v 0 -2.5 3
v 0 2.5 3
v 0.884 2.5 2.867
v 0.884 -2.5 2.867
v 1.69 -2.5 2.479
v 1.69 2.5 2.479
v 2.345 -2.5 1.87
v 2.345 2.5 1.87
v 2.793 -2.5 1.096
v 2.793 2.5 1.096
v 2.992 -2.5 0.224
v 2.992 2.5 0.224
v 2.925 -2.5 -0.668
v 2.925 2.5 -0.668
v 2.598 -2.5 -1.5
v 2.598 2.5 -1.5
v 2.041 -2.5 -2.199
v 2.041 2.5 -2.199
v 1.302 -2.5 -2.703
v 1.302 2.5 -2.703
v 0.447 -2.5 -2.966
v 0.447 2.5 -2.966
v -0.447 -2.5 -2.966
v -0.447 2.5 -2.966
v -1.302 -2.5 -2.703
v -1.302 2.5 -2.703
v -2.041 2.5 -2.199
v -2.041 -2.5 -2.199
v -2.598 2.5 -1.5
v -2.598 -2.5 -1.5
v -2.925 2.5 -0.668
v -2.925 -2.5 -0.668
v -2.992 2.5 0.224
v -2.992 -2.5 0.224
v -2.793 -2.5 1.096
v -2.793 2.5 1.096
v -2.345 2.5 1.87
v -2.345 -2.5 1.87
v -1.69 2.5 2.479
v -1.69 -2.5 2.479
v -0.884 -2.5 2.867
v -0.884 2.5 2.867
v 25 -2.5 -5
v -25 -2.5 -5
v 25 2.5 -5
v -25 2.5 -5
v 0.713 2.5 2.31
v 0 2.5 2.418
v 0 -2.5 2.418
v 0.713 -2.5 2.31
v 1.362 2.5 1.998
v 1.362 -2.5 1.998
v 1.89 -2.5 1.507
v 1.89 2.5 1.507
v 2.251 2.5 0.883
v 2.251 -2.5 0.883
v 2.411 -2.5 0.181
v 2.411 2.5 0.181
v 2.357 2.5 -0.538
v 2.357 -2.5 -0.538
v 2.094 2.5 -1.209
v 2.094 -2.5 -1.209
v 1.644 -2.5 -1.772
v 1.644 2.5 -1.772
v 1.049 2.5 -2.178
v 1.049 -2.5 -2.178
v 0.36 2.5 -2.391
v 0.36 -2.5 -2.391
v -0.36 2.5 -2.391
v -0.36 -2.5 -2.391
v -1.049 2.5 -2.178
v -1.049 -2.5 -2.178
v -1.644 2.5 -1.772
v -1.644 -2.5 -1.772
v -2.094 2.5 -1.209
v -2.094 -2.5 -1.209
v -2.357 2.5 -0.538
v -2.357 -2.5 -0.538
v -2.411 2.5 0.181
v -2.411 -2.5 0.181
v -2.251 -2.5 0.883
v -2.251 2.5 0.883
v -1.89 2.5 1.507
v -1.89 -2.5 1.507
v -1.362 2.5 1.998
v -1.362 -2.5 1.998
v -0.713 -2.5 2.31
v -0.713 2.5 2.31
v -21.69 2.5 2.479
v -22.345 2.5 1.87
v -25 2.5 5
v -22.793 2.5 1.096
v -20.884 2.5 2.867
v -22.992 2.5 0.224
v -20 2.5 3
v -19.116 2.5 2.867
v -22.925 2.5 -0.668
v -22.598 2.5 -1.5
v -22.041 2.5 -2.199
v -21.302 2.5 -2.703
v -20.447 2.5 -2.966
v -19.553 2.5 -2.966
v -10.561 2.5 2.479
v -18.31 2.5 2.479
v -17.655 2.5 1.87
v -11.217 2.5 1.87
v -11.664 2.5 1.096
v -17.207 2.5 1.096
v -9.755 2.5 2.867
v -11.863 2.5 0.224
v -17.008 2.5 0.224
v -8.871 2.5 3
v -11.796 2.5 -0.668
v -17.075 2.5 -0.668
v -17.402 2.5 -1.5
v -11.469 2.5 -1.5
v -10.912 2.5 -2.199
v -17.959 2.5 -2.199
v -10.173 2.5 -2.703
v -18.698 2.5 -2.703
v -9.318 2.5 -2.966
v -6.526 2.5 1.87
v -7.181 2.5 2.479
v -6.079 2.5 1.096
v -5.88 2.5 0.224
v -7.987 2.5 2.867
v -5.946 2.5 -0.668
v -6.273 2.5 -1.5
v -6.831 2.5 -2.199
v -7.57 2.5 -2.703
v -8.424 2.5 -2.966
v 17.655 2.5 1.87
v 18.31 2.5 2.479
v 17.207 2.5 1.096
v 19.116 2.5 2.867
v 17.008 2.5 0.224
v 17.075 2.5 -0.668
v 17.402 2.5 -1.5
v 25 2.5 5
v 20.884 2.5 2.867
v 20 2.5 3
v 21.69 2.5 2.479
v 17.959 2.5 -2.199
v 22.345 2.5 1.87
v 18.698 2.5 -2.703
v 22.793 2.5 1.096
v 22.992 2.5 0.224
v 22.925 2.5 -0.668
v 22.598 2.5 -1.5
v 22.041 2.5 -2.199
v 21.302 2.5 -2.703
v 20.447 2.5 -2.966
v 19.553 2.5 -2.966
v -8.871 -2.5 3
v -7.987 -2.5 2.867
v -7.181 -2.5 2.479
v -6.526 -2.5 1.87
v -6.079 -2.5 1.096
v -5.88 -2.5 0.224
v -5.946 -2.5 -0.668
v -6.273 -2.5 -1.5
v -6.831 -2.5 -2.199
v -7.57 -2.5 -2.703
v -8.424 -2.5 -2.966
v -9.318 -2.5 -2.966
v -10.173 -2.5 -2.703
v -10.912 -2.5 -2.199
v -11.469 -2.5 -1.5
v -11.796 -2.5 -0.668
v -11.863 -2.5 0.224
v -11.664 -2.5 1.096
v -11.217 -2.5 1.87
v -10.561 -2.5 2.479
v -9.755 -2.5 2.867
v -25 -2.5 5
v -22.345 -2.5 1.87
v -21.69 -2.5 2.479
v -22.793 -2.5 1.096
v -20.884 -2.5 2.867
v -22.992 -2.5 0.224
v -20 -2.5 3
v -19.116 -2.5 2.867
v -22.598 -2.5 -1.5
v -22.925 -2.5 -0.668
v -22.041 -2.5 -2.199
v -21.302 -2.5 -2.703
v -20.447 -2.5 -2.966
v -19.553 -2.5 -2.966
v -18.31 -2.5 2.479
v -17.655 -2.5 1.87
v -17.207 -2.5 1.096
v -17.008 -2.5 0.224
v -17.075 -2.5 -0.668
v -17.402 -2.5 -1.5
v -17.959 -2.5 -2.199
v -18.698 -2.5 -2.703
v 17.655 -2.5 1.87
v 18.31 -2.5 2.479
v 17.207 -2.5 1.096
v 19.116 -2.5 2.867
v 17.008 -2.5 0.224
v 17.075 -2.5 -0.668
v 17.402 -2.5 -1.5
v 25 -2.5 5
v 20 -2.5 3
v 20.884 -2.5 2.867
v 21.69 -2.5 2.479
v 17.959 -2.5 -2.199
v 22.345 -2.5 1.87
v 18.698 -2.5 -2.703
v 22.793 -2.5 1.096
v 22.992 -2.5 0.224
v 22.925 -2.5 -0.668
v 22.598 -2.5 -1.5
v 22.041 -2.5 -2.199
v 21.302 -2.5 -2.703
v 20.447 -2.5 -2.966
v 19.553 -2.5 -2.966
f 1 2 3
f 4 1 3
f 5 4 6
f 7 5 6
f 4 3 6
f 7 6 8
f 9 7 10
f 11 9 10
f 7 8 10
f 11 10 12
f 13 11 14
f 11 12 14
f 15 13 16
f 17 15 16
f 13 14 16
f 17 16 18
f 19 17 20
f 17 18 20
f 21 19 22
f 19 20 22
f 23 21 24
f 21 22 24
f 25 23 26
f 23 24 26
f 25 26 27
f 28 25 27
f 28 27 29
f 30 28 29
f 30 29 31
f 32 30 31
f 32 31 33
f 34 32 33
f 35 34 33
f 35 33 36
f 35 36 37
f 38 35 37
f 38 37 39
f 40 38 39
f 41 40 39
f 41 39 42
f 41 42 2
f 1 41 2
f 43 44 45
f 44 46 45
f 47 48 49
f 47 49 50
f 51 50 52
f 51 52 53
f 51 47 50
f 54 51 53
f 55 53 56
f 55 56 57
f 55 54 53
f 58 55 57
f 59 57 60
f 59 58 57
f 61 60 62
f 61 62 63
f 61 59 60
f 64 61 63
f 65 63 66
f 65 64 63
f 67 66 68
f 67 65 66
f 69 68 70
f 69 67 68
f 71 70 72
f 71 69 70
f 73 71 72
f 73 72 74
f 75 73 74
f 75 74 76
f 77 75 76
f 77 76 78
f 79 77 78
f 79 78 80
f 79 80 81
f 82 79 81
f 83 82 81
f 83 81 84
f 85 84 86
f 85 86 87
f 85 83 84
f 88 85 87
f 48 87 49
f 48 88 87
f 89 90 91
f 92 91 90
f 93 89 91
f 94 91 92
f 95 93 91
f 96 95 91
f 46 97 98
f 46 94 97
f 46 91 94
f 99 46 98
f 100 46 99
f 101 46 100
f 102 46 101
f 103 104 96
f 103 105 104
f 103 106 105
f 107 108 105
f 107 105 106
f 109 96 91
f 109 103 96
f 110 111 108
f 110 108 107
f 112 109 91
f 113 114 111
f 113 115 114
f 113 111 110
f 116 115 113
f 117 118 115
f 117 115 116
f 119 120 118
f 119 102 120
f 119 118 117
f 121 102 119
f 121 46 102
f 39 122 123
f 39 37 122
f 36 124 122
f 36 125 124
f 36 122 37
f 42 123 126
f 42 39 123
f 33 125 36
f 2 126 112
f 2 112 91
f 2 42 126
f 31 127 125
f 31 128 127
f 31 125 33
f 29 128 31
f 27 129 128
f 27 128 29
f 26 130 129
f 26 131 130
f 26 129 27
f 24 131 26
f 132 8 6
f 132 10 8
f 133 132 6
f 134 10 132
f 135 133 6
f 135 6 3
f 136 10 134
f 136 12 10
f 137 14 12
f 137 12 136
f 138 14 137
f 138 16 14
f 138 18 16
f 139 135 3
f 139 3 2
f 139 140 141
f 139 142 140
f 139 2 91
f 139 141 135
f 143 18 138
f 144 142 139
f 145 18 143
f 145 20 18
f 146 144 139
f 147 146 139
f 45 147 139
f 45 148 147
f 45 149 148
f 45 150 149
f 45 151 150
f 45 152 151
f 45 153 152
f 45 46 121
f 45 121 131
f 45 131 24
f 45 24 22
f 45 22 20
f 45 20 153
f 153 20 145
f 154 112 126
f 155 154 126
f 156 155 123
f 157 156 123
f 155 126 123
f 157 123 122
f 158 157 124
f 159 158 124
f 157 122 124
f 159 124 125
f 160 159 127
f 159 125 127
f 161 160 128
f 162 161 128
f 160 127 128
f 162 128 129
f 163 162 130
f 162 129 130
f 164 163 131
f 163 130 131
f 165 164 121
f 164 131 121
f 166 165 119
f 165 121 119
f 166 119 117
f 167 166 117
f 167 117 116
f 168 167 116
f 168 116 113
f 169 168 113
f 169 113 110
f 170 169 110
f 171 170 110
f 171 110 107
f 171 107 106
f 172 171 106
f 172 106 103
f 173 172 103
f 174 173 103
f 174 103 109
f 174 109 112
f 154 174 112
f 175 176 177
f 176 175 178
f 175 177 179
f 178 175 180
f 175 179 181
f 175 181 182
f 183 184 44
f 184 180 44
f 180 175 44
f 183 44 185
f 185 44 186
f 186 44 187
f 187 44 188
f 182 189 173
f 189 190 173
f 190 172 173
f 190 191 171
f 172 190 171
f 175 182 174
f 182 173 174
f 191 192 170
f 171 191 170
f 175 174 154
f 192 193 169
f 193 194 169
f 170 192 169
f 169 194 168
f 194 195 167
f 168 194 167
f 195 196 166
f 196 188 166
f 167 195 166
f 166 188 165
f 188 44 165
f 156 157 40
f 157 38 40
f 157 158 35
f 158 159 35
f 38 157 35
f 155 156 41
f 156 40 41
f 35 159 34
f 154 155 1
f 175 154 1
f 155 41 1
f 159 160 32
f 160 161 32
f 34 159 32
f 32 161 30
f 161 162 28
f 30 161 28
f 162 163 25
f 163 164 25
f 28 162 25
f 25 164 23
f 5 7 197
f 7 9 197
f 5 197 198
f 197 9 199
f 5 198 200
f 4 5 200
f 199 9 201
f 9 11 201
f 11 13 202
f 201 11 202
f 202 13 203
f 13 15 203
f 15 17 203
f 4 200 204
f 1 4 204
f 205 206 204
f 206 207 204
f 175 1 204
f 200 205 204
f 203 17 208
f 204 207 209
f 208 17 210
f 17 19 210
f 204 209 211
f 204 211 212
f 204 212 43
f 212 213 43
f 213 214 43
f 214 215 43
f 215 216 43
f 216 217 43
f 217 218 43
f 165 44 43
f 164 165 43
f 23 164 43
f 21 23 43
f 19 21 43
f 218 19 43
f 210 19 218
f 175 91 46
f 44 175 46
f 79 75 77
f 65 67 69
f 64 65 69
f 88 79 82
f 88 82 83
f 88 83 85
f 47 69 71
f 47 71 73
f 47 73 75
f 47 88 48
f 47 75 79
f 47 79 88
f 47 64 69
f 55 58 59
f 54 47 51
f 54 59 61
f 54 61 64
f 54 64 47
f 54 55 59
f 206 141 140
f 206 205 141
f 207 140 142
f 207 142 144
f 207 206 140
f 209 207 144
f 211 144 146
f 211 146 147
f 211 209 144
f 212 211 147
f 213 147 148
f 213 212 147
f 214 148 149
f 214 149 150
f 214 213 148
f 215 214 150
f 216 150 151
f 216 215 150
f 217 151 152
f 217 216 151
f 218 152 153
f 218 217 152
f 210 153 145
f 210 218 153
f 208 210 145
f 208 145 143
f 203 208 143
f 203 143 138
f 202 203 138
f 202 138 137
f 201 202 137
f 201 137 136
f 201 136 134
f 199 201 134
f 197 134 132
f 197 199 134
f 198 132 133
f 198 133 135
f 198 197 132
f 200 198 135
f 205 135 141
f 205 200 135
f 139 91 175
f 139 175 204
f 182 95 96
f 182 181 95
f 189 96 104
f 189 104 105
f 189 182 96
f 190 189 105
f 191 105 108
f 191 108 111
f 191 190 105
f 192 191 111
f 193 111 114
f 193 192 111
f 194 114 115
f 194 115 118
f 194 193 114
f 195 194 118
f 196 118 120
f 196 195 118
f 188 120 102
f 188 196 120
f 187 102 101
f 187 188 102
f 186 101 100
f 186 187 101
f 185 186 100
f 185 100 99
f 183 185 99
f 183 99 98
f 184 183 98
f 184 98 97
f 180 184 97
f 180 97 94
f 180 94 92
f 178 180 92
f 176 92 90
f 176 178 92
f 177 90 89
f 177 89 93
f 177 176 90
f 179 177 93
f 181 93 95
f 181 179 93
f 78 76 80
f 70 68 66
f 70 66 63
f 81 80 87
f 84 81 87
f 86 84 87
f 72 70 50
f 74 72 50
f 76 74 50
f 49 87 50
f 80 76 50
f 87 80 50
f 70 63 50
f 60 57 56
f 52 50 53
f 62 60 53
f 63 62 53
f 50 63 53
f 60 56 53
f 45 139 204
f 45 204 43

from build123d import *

# Parameters (mm, degrees)
SKETCH1_W           = 50
SKETCH1_H           = 10
SKETCH1_R           = 3
BOSS_EXTRUDE1_DEPTH = 2.5
SKETCH2_R           = 3
CUT_EXTRUDE1_DEPTH  = 26.980762114
SKETCH3_R           = 3
CUT_EXTRUDE2_DEPTH  = 26.980762114
SKETCH4_R           = 2.417633123
BOSS_EXTRUDE3_DEPTH = 5


with BuildPart() as part:
    # Sketch1 → Boss-Extrude1 (new, symmetric)
    with BuildSketch(Plane(origin=(0, 0, 0), x_dir=(1, 0, 0), z_dir=(0, 1, 0))):
        Rectangle(SKETCH1_W, SKETCH1_H)
        with Locations(Location((-20, 0, 0), (0, 0, 270))):
            Circle(SKETCH1_R, mode=Mode.SUBTRACT)
        with Locations(Location((20, 0, 0), (0, 0, 270))):
            Circle(SKETCH1_R, mode=Mode.SUBTRACT)
    extrude(amount=BOSS_EXTRUDE1_DEPTH, both=True)

    # Sketch2 → Cut-Extrude1 (cut, through all)
    with BuildSketch(Plane(origin=(0, 2.5, 0), x_dir=(1, 0, 0), z_dir=(0, 1, 0))):
        with Locations(Location((0, 0, 0), (0, 0, 270))):
            Circle(SKETCH2_R)
    extrude(amount=-CUT_EXTRUDE1_DEPTH, mode=Mode.SUBTRACT)

    # Sketch3 → Cut-Extrude2 (cut, through all)
    with BuildSketch(Plane(origin=(0, 2.5, 0), x_dir=(1, 0, 0), z_dir=(0, 1, 0))):
        with Locations(Location((-8.871229838, 0, 0), (0, 0, 270))):
            Circle(SKETCH3_R)
    extrude(amount=-CUT_EXTRUDE2_DEPTH, mode=Mode.SUBTRACT)


with BuildPart() as body_2:
    # Sketch4 → Boss-Extrude3 (new, through all)
    with BuildSketch(Plane(origin=(0, 2.5, 0), x_dir=(1, 0, 0), z_dir=(0, 1, 0))):
        with Locations(Location((0, 0, 0), (0, 0, 270))):
            Circle(SKETCH4_R)
    extrude(amount=-BOSS_EXTRUDE3_DEPTH)


solid = Compound([part.part, body_2.part])
